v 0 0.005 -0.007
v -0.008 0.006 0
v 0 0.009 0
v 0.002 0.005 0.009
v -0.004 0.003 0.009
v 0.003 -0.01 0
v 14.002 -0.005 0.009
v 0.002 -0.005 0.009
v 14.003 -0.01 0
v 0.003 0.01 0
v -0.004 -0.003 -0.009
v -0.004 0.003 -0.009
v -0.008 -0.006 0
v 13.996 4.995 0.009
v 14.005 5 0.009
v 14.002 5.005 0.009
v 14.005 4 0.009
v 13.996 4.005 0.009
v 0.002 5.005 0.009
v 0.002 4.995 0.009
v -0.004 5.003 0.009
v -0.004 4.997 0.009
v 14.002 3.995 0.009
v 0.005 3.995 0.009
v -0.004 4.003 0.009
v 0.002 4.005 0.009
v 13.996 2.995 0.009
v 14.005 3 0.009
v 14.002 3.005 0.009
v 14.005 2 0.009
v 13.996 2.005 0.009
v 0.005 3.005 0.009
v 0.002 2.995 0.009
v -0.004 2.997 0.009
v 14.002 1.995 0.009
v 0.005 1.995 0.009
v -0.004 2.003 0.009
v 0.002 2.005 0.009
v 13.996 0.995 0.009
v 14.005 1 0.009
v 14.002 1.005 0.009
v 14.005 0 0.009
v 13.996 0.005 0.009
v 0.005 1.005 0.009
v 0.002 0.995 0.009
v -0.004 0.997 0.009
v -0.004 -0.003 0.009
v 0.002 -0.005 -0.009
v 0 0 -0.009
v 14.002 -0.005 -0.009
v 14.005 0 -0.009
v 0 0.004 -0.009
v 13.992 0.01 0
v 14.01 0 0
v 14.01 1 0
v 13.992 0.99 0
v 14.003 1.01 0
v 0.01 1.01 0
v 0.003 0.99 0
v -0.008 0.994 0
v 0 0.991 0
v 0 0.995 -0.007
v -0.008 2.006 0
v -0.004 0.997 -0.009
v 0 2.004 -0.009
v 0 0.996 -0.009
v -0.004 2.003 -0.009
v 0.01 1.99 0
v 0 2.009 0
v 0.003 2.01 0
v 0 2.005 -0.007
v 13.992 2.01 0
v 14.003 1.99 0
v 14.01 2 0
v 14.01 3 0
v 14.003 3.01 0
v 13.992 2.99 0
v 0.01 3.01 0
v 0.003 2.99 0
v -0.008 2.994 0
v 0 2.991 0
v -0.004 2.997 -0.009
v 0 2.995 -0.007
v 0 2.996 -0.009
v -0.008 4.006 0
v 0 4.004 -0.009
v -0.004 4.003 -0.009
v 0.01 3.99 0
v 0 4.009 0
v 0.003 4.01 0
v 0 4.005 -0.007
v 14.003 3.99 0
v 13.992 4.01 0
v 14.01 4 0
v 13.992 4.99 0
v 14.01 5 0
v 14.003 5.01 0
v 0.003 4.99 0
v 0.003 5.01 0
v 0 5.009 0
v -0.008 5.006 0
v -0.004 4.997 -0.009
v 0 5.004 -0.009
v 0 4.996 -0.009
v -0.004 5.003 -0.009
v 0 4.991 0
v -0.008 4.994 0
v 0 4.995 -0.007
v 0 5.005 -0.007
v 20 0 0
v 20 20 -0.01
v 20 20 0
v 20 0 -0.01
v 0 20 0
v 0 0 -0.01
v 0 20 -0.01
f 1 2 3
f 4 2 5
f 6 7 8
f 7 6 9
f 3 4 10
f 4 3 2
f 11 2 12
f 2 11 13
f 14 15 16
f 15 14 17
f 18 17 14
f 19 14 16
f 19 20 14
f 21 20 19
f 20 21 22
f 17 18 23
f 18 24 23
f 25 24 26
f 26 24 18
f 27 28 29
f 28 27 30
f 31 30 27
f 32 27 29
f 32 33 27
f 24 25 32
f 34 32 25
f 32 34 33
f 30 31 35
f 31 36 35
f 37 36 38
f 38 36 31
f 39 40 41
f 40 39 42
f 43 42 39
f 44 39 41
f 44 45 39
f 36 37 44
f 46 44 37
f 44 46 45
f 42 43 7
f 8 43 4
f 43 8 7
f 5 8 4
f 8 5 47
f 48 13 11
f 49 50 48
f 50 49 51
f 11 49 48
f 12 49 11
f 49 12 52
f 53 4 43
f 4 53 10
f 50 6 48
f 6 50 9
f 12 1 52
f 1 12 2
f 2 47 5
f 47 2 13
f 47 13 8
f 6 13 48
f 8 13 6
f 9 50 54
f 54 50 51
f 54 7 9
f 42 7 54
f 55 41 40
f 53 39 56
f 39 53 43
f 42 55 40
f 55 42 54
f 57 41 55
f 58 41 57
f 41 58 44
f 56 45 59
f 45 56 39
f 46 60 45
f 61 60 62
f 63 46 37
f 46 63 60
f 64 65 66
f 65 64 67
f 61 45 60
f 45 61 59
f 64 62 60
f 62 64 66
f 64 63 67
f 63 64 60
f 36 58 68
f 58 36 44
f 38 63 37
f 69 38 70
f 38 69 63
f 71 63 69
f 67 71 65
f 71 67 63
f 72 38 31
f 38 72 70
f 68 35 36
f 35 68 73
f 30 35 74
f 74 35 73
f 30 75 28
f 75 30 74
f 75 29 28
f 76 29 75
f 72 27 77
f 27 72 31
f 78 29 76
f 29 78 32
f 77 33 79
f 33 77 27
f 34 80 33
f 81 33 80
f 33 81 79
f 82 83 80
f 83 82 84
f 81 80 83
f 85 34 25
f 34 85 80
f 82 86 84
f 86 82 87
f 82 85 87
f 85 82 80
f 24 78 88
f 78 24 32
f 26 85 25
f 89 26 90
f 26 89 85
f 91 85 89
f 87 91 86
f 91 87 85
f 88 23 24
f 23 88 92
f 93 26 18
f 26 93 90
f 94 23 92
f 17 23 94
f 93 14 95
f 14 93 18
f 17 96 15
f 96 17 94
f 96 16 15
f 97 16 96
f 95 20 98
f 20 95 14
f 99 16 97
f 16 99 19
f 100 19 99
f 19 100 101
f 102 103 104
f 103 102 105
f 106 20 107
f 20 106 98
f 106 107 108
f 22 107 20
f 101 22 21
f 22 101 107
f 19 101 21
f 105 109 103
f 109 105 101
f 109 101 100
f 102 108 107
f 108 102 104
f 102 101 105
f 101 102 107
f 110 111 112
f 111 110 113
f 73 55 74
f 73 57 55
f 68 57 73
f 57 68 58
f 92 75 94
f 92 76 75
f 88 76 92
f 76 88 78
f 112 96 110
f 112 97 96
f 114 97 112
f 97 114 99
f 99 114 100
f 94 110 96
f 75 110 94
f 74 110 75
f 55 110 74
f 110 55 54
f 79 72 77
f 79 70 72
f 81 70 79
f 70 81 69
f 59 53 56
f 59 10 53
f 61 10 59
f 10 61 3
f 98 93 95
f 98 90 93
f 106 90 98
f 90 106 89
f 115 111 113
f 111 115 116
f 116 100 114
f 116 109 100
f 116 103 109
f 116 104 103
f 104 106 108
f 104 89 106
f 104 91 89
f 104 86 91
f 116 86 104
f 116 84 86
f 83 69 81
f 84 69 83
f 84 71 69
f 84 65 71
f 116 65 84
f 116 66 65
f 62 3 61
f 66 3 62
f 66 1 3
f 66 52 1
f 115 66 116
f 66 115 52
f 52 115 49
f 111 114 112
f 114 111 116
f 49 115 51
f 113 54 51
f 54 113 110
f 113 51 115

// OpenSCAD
hull(){
    translate([0, 0]) sphere(0.01);
    translate([1, 0]) sphere(0.01);
}
hull(){
    translate([1, 0]) sphere(0.01);
    translate([2, 0]) sphere(0.01);
}
hull(){
    translate([2, 0]) sphere(0.01);
    translate([3, 0]) sphere(0.01);
}
hull(){
    translate([3, 0]) sphere(0.01);
    translate([4, 0]) sphere(0.01);
}
hull(){
    translate([4, 0]) sphere(0.01);
    translate([5, 0]) sphere(0.01);
}
hull(){
    translate([5, 0]) sphere(0.01);
    translate([6, 0]) sphere(0.01);
}
hull(){
    translate([6, 0]) sphere(0.01);
    translate([7, 0]) sphere(0.01);
}
hull(){
    translate([7, 0]) sphere(0.01);
    translate([8, 0]) sphere(0.01);
}
hull(){
    translate([8, 0]) sphere(0.01);
    translate([9, 0]) sphere(0.01);
}
hull(){
    translate([9, 0]) sphere(0.01);
    translate([10, 0]) sphere(0.01);
}
hull(){
    translate([10, 0]) sphere(0.01);
    translate([11, 0]) sphere(0.01);
}
hull(){
    translate([11, 0]) sphere(0.01);
    translate([12, 0]) sphere(0.01);
}
hull(){
    translate([12, 0]) sphere(0.01);
    translate([13, 0]) sphere(0.01);
}
hull(){
    translate([13, 0]) sphere(0.01);
    translate([14, 0]) sphere(0.01);
}
hull(){
    translate([14, 0]) sphere(0.01);
    translate([14, 1]) sphere(0.01);
}
hull(){
    translate([14, 1]) sphere(0.01);
    translate([13, 1]) sphere(0.01);
}
hull(){
    translate([13, 1]) sphere(0.01);
    translate([12, 1]) sphere(0.01);
}
hull(){
    translate([12, 1]) sphere(0.01);
    translate([11, 1]) sphere(0.01);
}
hull(){
    translate([11, 1]) sphere(0.01);
    translate([10, 1]) sphere(0.01);
}
hull(){
    translate([10, 1]) sphere(0.01);
    translate([9, 1]) sphere(0.01);
}
hull(){
    translate([9, 1]) sphere(0.01);
    translate([8, 1]) sphere(0.01);
}
hull(){
    translate([8, 1]) sphere(0.01);
    translate([7, 1]) sphere(0.01);
}
hull(){
    translate([7, 1]) sphere(0.01);
    translate([6, 1]) sphere(0.01);
}
hull(){
    translate([6, 1]) sphere(0.01);
    translate([5, 1]) sphere(0.01);
}
hull(){
    translate([5, 1]) sphere(0.01);
    translate([4, 1]) sphere(0.01);
}
hull(){
    translate([4, 1]) sphere(0.01);
    translate([3, 1]) sphere(0.01);
}
hull(){
    translate([3, 1]) sphere(0.01);
    translate([2, 1]) sphere(0.01);
}
hull(){
    translate([2, 1]) sphere(0.01);
    translate([1, 1]) sphere(0.01);
}
hull(){
    translate([1, 1]) sphere(0.01);
    translate([0, 1]) sphere(0.01);
}
hull(){
    translate([0, 1]) sphere(0.01);
    translate([0, 2]) sphere(0.01);
}
hull(){
    translate([0, 2]) sphere(0.01);
    translate([1, 2]) sphere(0.01);
}
hull(){
    translate([1, 2]) sphere(0.01);
    translate([2, 2]) sphere(0.01);
}
hull(){
    translate([2, 2]) sphere(0.01);
    translate([3, 2]) sphere(0.01);
}
hull(){
    translate([3, 2]) sphere(0.01);
    translate([4, 2]) sphere(0.01);
}
hull(){
    translate([4, 2]) sphere(0.01);
    translate([5, 2]) sphere(0.01);
}
hull(){
    translate([5, 2]) sphere(0.01);
    translate([6, 2]) sphere(0.01);
}
hull(){
    translate([6, 2]) sphere(0.01);
    translate([7, 2]) sphere(0.01);
}
hull(){
    translate([7, 2]) sphere(0.01);
    translate([8, 2]) sphere(0.01);
}
hull(){
    translate([8, 2]) sphere(0.01);
    translate([9, 2]) sphere(0.01);
}
hull(){
    translate([9, 2]) sphere(0.01);
    translate([10, 2]) sphere(0.01);
}
hull(){
    translate([10, 2]) sphere(0.01);
    translate([11, 2]) sphere(0.01);
}
hull(){
    translate([11, 2]) sphere(0.01);
    translate([12, 2]) sphere(0.01);
}
hull(){
    translate([12, 2]) sphere(0.01);
    translate([13, 2]) sphere(0.01);
}
hull(){
    translate([13, 2]) sphere(0.01);
    translate([14, 2]) sphere(0.01);
}
hull(){
    translate([14, 2]) sphere(0.01);
    translate([14, 3]) sphere(0.01);
}
hull(){
    translate([14, 3]) sphere(0.01);
    translate([13, 3]) sphere(0.01);
}
hull(){
    translate([13, 3]) sphere(0.01);
    translate([12, 3]) sphere(0.01);
}
hull(){
    translate([12, 3]) sphere(0.01);
    translate([11, 3]) sphere(0.01);
}
hull(){
    translate([11, 3]) sphere(0.01);
    translate([10, 3]) sphere(0.01);
}
hull(){
    translate([10, 3]) sphere(0.01);
    translate([9, 3]) sphere(0.01);
}
hull(){
    translate([9, 3]) sphere(0.01);
    translate([8, 3]) sphere(0.01);
}
hull(){
    translate([8, 3]) sphere(0.01);
    translate([7, 3]) sphere(0.01);
}
hull(){
    translate([7, 3]) sphere(0.01);
    translate([6, 3]) sphere(0.01);
}
hull(){
    translate([6, 3]) sphere(0.01);
    translate([5, 3]) sphere(0.01);
}
hull(){
    translate([5, 3]) sphere(0.01);
    translate([4, 3]) sphere(0.01);
}
hull(){
    translate([4, 3]) sphere(0.01);
    translate([3, 3]) sphere(0.01);
}
hull(){
    translate([3, 3]) sphere(0.01);
    translate([2, 3]) sphere(0.01);
}
hull(){
    translate([2, 3]) sphere(0.01);
    translate([1, 3]) sphere(0.01);
}
hull(){
    translate([1, 3]) sphere(0.01);
    translate([0, 3]) sphere(0.01);
}
hull(){
    translate([0, 3]) sphere(0.01);
    translate([0, 4]) sphere(0.01);
}
hull(){
    translate([0, 4]) sphere(0.01);
    translate([1, 4]) sphere(0.01);
}
hull(){
    translate([1, 4]) sphere(0.01);
    translate([2, 4]) sphere(0.01);
}
hull(){
    translate([2, 4]) sphere(0.01);
    translate([3, 4]) sphere(0.01);
}
hull(){
    translate([3, 4]) sphere(0.01);
    translate([4, 4]) sphere(0.01);
}
hull(){
    translate([4, 4]) sphere(0.01);
    translate([5, 4]) sphere(0.01);
}
hull(){
    translate([5, 4]) sphere(0.01);
    translate([6, 4]) sphere(0.01);
}
hull(){
    translate([6, 4]) sphere(0.01);
    translate([7, 4]) sphere(0.01);
}
hull(){
    translate([7, 4]) sphere(0.01);
    translate([8, 4]) sphere(0.01);
}
hull(){
    translate([8, 4]) sphere(0.01);
    translate([9, 4]) sphere(0.01);
}
hull(){
    translate([9, 4]) sphere(0.01);
    translate([10, 4]) sphere(0.01);
}
hull(){
    translate([10, 4]) sphere(0.01);
    translate([11, 4]) sphere(0.01);
}
hull(){
    translate([11, 4]) sphere(0.01);
    translate([12, 4]) sphere(0.01);
}
hull(){
    translate([12, 4]) sphere(0.01);
    translate([13, 4]) sphere(0.01);
}
hull(){
    translate([13, 4]) sphere(0.01);
    translate([14, 4]) sphere(0.01);
}
hull(){
    translate([14, 4]) sphere(0.01);
    translate([14, 5]) sphere(0.01);
}
hull(){
    translate([14, 5]) sphere(0.01);
    translate([13, 5]) sphere(0.01);
}
hull(){
    translate([13, 5]) sphere(0.01);
    translate([12, 5]) sphere(0.01);
}
hull(){
    translate([12, 5]) sphere(0.01);
    translate([11, 5]) sphere(0.01);
}
hull(){
    translate([11, 5]) sphere(0.01);
    translate([10, 5]) sphere(0.01);
}
hull(){
    translate([10, 5]) sphere(0.01);
    translate([9, 5]) sphere(0.01);
}
hull(){
    translate([9, 5]) sphere(0.01);
    translate([8, 5]) sphere(0.01);
}
hull(){
    translate([8, 5]) sphere(0.01);
    translate([7, 5]) sphere(0.01);
}
hull(){
    translate([7, 5]) sphere(0.01);
    translate([6, 5]) sphere(0.01);
}
hull(){
    translate([6, 5]) sphere(0.01);
    translate([5, 5]) sphere(0.01);
}
hull(){
    translate([5, 5]) sphere(0.01);
    translate([4, 5]) sphere(0.01);
}
hull(){
    translate([4, 5]) sphere(0.01);
    translate([3, 5]) sphere(0.01);
}
hull(){
    translate([3, 5]) sphere(0.01);
    translate([2, 5]) sphere(0.01);
}
hull(){
    translate([2, 5]) sphere(0.01);
    translate([1, 5]) sphere(0.01);
}
hull(){
    translate([1, 5]) sphere(0.01);
    translate([0, 5]) sphere(0.01);
}
translate([0,0,-0.01]) color([0.1,0.1,0.1]) cube([20,20,0.01]);
